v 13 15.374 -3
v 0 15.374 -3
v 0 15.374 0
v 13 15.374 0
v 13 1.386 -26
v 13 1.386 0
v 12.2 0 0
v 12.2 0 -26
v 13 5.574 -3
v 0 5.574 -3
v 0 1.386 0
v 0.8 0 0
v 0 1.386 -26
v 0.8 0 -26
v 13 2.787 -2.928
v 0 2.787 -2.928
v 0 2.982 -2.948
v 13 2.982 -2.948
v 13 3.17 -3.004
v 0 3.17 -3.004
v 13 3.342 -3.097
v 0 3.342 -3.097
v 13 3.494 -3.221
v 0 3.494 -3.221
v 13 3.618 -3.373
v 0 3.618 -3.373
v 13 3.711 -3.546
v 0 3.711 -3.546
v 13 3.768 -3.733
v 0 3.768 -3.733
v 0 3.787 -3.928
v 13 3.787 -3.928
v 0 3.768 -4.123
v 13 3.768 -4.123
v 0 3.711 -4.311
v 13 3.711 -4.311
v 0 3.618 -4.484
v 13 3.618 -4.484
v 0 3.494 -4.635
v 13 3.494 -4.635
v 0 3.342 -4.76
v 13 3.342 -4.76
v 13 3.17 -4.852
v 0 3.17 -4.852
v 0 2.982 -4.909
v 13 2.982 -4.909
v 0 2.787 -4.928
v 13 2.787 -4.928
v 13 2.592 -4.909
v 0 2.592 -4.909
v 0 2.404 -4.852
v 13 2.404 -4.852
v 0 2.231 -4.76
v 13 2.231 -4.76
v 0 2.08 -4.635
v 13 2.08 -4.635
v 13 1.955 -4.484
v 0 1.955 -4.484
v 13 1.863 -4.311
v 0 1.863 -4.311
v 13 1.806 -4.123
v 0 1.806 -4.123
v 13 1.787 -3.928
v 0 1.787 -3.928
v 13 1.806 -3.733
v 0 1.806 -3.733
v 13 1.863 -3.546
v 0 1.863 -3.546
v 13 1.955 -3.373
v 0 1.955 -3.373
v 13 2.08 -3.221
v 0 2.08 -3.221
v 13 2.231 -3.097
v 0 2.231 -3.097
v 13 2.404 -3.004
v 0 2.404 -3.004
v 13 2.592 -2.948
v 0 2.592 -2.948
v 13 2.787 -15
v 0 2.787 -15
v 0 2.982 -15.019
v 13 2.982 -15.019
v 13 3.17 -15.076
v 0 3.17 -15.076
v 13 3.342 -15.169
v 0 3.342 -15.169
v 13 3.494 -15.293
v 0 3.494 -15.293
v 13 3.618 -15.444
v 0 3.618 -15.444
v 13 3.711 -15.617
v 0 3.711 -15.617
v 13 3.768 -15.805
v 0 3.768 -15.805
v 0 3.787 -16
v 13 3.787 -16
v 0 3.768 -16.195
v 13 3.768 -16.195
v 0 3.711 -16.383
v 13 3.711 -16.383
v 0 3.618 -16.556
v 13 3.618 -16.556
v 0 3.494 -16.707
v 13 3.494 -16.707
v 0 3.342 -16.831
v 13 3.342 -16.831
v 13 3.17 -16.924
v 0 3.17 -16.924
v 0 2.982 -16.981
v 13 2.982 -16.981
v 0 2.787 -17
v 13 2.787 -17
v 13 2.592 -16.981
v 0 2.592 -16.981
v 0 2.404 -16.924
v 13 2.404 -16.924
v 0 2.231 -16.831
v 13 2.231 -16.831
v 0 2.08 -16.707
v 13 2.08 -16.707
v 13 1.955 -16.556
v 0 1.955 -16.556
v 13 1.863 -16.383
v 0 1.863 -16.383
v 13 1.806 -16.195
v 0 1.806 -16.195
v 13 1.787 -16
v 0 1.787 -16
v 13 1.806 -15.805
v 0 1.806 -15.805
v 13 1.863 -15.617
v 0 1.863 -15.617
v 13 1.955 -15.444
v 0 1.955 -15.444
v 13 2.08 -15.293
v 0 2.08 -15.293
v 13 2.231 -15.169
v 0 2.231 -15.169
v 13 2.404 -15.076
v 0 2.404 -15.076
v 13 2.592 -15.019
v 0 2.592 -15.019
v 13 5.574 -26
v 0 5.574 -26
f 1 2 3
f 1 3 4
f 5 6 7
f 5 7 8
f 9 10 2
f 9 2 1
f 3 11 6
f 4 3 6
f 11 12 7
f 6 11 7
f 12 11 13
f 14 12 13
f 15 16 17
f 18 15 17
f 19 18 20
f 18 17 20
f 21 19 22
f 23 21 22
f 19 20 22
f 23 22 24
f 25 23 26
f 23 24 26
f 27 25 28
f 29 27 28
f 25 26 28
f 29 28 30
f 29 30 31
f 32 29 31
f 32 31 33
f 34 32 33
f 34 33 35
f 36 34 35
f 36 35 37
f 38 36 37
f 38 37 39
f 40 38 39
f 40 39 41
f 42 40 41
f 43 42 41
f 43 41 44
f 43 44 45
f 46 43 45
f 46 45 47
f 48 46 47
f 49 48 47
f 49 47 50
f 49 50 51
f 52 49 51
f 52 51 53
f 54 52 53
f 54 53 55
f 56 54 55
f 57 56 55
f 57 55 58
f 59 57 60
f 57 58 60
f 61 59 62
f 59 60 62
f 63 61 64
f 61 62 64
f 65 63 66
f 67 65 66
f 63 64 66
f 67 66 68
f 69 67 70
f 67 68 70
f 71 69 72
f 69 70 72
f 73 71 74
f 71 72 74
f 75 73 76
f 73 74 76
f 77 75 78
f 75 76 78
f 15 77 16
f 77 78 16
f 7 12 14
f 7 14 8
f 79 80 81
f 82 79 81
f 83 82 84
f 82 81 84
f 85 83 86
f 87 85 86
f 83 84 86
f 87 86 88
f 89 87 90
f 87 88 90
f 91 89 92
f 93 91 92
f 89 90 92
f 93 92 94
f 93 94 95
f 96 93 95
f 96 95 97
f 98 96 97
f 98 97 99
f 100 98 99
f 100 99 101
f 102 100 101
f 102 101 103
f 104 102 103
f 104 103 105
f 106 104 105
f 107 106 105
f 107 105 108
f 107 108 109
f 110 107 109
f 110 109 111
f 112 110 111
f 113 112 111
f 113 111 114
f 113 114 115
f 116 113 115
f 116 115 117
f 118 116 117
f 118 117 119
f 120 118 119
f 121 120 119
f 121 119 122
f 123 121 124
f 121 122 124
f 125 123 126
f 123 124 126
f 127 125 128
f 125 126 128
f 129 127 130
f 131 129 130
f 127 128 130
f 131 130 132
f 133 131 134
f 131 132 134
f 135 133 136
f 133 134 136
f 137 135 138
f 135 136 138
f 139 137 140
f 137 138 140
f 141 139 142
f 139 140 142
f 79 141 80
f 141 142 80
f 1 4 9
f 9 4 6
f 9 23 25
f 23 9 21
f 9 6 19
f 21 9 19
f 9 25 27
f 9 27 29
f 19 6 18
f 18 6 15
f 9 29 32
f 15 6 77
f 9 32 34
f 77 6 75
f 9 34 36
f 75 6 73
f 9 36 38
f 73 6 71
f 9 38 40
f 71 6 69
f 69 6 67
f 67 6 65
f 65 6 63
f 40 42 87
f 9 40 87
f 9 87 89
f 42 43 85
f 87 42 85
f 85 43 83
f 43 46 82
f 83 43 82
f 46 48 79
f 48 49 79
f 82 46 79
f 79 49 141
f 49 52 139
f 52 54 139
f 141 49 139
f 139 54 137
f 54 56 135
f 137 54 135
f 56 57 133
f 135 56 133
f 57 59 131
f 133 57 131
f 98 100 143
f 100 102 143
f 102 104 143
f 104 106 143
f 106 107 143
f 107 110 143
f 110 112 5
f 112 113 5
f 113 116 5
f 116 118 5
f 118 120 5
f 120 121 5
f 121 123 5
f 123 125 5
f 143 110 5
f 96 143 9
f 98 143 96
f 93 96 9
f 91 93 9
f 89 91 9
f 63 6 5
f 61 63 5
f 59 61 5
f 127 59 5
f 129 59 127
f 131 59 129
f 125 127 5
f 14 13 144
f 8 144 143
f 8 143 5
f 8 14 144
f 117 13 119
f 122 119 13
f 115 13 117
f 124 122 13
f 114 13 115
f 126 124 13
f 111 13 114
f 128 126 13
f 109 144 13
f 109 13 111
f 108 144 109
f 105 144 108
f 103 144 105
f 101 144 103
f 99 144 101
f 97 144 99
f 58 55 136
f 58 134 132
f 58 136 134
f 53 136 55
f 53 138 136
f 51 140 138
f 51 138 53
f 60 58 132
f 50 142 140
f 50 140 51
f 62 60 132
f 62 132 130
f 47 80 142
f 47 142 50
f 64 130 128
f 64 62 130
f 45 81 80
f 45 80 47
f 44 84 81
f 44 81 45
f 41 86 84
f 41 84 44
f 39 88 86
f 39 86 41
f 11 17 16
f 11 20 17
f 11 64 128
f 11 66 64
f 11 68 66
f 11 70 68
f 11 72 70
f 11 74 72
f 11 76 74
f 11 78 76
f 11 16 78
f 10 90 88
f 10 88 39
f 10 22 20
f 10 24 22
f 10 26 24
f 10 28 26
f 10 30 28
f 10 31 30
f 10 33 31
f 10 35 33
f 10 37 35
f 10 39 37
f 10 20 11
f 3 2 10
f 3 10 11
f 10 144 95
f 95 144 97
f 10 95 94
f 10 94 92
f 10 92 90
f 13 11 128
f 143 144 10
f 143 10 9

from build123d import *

# Parameters (mm, degrees)
SKETCH_1_W          = 13
SKETCH_1_H          = 26
EXTRUDE_1_DEPTH     = 5.57372
SKETCH_2_W          = 13
SKETCH_2_H          = 3
EXTRUDE_2_DEPTH     = 9.8
SKETCH_4_R          = 1
CUT_EXTRUDE_1_DEPTH = 14
CHAMFER_2_SIZE      = 0.8
CHAMFER_2_SIZE2     = 1.385640646
SKETCH_5_R          = 1
EXTRUDE_3_DEPTH     = 13
SKETCH_6_R          = 1
CUT_EXTRUDE_2_DEPTH = 14


with BuildPart() as part:
    # ｽｹｯﾁ1 → ﾎﾞｽ - 押し出し1 (new body)
    with BuildSketch(Plane(origin=(0, 0, 0), x_dir=(1, 0, 0), z_dir=(0, 1, 0))):
        with Locations((6.5, 13)):
            Rectangle(SKETCH_1_W, SKETCH_1_H)
    extrude(amount=EXTRUDE_1_DEPTH)

    # ｽｹｯﾁ2 → ﾎﾞｽ - 押し出し2 (add)
    with BuildSketch(Plane(origin=(0, 5.57372, 0), x_dir=(1, 0, 0), z_dir=(0, 1, 0))):
        with Locations((6.5, 1.5)):
            Rectangle(SKETCH_2_W, SKETCH_2_H)
    extrude(amount=EXTRUDE_2_DEPTH)

    # ｽｹｯﾁ4 → ｶｯﾄ - 押し出し1 (cut, through all)
    with BuildSketch(Plane.ZY):
        with Locations((-16, 2.78686)):
            Circle(SKETCH_4_R)
        with Locations((-4, 2.78686)):
            Circle(SKETCH_4_R)
    extrude(amount=-CUT_EXTRUDE_1_DEPTH, mode=Mode.SUBTRACT)

    # 面取り2
    chamfer_2_edges = [part.edges().sort_by_distance(p)[0] for p in [
        (13, 0, -13),
        (0, 0, -13),
    ]]
    chamfer_2_side = [part.faces().sort_by_distance(p)[0] for p in [
        (6.5, 0, -13),
    ]]
    chamfer(chamfer_2_edges, length=CHAMFER_2_SIZE, length2=CHAMFER_2_SIZE2, reference=chamfer_2_side[0])

    # ｽｹｯﾁ5 → ﾎﾞｽ - 押し出し3 (add, through all)
    with BuildSketch(Plane.ZY):
        with Locations((-4, 2.78686)):
            Circle(SKETCH_5_R)
    extrude(amount=-EXTRUDE_3_DEPTH)

    # ｽｹｯﾁ6 → ｶｯﾄ - 押し出し2 (cut, through all)
    with BuildSketch(Plane.ZY):
        with Locations((-3.92837, 2.78686)):
            Circle(SKETCH_6_R)
    extrude(amount=-CUT_EXTRUDE_2_DEPTH, mode=Mode.SUBTRACT)


solid = part.part
